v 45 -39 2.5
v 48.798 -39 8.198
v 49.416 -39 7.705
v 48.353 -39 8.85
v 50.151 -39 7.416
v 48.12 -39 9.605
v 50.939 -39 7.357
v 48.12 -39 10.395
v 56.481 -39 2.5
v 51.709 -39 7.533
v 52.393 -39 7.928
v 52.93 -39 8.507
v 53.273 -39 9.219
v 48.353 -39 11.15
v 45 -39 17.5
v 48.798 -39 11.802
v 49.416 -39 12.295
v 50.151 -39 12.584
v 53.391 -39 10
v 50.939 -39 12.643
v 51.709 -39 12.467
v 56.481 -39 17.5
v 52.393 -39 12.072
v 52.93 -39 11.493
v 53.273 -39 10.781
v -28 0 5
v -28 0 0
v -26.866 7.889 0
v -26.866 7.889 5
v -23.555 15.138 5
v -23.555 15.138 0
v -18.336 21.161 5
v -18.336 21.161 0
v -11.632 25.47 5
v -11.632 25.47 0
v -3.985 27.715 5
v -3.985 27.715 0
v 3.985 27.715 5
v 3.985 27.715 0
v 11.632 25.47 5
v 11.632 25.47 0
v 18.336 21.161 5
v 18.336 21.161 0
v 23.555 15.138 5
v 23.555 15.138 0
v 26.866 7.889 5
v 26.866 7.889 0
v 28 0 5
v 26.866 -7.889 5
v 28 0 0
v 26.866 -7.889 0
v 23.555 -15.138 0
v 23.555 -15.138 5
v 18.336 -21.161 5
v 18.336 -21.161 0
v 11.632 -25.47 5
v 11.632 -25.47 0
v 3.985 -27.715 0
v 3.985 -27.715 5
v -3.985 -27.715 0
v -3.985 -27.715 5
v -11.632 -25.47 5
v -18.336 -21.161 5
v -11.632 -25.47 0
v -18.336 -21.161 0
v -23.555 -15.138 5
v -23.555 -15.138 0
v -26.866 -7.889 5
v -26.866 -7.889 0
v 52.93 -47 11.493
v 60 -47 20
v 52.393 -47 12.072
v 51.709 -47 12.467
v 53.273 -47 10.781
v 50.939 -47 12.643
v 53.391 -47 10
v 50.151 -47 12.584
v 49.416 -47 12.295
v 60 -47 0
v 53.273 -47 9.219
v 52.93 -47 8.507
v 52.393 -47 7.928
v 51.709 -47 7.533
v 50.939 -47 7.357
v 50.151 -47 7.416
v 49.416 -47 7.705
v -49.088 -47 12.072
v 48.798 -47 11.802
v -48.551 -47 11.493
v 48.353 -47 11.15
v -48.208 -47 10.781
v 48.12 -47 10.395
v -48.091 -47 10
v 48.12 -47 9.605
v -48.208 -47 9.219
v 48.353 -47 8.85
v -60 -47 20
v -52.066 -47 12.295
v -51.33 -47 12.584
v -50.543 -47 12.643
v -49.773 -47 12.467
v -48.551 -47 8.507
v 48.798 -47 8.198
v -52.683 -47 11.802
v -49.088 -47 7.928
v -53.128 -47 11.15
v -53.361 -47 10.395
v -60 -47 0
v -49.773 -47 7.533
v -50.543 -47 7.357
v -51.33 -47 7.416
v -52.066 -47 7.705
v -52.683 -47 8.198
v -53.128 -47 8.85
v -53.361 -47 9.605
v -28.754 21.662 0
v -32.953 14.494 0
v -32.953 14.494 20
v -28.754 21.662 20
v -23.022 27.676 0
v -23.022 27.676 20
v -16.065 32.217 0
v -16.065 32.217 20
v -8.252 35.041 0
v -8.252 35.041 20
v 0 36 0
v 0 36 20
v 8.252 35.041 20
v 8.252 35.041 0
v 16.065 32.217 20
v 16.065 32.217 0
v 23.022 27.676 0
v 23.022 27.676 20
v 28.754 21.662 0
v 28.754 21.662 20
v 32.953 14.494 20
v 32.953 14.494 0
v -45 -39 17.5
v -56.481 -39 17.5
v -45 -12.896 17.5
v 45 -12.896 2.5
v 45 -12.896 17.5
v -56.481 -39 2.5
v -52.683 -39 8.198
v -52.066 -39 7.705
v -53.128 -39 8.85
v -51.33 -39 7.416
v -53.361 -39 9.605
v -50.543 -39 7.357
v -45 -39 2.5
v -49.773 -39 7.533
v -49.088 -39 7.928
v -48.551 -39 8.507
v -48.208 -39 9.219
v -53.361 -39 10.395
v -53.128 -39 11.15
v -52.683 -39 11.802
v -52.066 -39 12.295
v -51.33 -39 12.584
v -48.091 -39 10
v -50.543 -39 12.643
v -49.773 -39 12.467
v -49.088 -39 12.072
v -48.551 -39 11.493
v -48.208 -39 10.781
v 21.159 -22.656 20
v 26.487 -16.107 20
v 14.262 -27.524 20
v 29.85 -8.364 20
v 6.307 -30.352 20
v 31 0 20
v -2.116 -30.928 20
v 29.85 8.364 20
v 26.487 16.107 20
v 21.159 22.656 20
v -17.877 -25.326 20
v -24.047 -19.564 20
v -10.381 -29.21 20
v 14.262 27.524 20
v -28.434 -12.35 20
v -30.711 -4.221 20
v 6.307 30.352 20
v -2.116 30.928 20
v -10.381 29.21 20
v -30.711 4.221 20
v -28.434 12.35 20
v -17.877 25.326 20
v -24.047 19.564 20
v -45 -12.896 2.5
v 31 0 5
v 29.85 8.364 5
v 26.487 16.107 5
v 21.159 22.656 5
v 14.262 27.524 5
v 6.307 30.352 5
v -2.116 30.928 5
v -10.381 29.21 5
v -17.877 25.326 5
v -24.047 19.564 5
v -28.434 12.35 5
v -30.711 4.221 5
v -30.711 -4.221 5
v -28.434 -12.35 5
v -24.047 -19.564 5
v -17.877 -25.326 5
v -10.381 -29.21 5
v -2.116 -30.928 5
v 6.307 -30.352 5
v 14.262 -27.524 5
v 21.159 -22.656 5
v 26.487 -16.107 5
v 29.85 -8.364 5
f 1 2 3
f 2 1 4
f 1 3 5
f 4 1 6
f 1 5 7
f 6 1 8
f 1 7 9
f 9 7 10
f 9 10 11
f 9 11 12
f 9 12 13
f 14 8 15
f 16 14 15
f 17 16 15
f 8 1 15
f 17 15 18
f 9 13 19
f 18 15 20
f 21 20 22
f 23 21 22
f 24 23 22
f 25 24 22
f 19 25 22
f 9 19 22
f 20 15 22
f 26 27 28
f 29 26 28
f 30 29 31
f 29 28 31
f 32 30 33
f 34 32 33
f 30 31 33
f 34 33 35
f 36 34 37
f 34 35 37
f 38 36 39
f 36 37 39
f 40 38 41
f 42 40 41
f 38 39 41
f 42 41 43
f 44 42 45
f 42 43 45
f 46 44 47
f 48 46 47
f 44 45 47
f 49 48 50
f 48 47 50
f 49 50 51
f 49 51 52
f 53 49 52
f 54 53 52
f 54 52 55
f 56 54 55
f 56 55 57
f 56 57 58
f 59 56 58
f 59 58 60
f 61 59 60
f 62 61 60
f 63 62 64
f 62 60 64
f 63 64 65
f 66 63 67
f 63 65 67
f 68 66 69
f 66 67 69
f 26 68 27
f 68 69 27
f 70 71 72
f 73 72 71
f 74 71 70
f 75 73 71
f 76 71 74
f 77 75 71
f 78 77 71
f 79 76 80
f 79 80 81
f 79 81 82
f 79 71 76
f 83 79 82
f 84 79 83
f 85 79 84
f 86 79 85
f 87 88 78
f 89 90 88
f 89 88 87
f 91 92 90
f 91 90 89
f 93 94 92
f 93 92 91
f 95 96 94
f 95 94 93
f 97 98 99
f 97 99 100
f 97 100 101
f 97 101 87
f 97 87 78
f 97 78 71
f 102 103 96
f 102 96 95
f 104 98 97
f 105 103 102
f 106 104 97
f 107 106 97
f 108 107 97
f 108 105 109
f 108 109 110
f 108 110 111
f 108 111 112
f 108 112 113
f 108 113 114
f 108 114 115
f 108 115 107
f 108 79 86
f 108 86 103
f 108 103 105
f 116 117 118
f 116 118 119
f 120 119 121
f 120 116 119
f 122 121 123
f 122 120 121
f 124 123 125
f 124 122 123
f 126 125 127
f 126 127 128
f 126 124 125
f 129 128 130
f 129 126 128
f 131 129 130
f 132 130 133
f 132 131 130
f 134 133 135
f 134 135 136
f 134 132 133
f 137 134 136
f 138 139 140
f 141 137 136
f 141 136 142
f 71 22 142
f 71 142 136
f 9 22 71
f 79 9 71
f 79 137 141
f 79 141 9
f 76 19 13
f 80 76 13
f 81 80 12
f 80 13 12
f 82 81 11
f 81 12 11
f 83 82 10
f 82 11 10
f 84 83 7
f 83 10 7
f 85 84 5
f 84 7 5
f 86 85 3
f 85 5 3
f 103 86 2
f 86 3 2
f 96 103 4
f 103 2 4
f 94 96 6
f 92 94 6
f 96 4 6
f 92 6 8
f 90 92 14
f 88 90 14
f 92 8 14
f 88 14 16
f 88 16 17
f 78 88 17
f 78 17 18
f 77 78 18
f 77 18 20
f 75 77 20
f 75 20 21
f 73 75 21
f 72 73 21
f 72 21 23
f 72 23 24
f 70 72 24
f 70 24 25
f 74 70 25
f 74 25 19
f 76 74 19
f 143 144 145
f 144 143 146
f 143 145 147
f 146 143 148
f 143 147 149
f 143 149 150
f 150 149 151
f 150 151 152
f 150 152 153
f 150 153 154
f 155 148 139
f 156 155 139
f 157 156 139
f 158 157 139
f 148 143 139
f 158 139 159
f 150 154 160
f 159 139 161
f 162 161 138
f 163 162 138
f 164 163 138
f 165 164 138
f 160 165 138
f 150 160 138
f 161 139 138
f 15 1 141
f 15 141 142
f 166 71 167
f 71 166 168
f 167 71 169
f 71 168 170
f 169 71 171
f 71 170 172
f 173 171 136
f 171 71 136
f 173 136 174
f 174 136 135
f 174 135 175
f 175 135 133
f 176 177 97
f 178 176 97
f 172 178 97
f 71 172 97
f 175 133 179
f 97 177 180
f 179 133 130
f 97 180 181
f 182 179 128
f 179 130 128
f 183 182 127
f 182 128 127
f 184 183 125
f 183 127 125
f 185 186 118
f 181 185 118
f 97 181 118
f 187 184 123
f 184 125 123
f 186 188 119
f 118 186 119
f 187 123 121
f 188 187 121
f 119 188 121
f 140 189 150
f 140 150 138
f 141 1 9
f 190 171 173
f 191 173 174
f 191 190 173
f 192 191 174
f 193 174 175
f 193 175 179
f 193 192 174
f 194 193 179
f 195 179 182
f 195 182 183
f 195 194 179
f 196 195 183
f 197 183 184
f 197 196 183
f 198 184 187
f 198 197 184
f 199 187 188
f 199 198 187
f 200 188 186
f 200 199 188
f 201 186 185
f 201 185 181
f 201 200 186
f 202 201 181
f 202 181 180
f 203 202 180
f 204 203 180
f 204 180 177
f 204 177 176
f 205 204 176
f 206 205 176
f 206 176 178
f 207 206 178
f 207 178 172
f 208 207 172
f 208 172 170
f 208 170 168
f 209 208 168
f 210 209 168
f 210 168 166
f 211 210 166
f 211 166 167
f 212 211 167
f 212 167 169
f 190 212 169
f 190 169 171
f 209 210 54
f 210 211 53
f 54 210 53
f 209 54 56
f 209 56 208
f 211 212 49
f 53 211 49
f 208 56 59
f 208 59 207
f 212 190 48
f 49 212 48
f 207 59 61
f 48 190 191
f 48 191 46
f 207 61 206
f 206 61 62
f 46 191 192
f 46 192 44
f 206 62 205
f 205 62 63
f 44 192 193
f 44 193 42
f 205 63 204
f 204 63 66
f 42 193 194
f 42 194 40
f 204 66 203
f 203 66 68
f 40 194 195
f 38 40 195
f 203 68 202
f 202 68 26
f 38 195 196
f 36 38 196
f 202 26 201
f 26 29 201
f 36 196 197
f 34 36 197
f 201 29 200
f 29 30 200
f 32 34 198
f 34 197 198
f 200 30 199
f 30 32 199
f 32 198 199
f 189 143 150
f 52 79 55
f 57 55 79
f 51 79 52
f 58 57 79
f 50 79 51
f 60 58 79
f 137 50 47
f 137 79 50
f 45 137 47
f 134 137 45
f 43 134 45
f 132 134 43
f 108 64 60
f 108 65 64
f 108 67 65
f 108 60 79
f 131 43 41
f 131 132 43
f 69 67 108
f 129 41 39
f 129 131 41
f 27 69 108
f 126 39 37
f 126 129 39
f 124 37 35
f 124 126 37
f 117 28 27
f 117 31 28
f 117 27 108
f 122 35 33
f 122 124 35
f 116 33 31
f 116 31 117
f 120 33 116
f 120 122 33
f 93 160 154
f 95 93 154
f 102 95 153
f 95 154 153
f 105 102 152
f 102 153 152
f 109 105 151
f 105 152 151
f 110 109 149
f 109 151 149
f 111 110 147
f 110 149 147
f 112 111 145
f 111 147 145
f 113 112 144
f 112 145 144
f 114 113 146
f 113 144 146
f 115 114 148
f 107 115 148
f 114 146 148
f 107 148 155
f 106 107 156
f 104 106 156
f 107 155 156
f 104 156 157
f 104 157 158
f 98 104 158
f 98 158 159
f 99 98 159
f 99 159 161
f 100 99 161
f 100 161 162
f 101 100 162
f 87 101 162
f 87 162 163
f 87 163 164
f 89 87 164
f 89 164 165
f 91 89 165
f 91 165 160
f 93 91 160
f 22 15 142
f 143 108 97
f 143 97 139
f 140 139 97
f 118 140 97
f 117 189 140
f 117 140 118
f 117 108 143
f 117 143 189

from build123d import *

# Parameters (mm, degrees)
SKETCH2_R           = 31
BOSS_EXTRUDE1_DEPTH = 20
SKETCH3_R           = 31
SKETCH3_R_2         = 28
BOSS_EXTRUDE2_DEPTH = 5
CUT_EXTRUDE1_START  = -8
SKETCH4_W           = 15
SKETCH4_H           = 15
CUT_EXTRUDE1_DEPTH  = 76
SKETCH5_R           = 2.65
CUT_EXTRUDE2_DEPTH  = 9


with BuildPart() as part:
    # Sketch2 → Boss-Extrude1 (new body)
    with BuildSketch(Plane.XY):
        with BuildLine():
            Line((-60, -47), (-32.953458565, 14.493776892))
            ThreePointArc((-32.953458565, 14.493776892), (0, 36), (32.953458565, 14.493776892))
            Line((32.953458565, 14.493776892), (60, -47))
            Line((60, -47), (-60, -47))
        make_face()
        Circle(SKETCH2_R, mode=Mode.SUBTRACT)
    extrude(amount=BOSS_EXTRUDE1_DEPTH)

    # Sketch3 → Boss-Extrude2 (add)
    with BuildSketch(Plane(origin=(0, 0, 0), x_dir=(-1, 0, 0), z_dir=(0, 0, -1))):
        Circle(SKETCH3_R)
        Circle(SKETCH3_R_2, mode=Mode.SUBTRACT)
    extrude(amount=-BOSS_EXTRUDE2_DEPTH)

    # Sketch4 → Cut-Extrude1 (cut, through all)
    with BuildSketch(Plane.XZ.offset(47).offset(CUT_EXTRUDE1_START)):
        with Locations((-52.5, 10)):
            Rectangle(SKETCH4_W, SKETCH4_H)
        with Locations((52.5, 10)):
            Rectangle(SKETCH4_W, SKETCH4_H)
    extrude(amount=-CUT_EXTRUDE1_DEPTH, mode=Mode.SUBTRACT)

    # Sketch5 → Cut-Extrude2 (cut, through all)
    with BuildSketch(Plane(origin=(0, -39, 0), x_dir=(1, 0, 0), z_dir=(0, 1, 0))):
        with Locations((-50.740697332, -10)):
            Circle(SKETCH5_R)
        with Locations((50.740697332, -10)):
            Circle(SKETCH5_R)
    extrude(amount=-CUT_EXTRUDE2_DEPTH, mode=Mode.SUBTRACT)


solid = part.part
